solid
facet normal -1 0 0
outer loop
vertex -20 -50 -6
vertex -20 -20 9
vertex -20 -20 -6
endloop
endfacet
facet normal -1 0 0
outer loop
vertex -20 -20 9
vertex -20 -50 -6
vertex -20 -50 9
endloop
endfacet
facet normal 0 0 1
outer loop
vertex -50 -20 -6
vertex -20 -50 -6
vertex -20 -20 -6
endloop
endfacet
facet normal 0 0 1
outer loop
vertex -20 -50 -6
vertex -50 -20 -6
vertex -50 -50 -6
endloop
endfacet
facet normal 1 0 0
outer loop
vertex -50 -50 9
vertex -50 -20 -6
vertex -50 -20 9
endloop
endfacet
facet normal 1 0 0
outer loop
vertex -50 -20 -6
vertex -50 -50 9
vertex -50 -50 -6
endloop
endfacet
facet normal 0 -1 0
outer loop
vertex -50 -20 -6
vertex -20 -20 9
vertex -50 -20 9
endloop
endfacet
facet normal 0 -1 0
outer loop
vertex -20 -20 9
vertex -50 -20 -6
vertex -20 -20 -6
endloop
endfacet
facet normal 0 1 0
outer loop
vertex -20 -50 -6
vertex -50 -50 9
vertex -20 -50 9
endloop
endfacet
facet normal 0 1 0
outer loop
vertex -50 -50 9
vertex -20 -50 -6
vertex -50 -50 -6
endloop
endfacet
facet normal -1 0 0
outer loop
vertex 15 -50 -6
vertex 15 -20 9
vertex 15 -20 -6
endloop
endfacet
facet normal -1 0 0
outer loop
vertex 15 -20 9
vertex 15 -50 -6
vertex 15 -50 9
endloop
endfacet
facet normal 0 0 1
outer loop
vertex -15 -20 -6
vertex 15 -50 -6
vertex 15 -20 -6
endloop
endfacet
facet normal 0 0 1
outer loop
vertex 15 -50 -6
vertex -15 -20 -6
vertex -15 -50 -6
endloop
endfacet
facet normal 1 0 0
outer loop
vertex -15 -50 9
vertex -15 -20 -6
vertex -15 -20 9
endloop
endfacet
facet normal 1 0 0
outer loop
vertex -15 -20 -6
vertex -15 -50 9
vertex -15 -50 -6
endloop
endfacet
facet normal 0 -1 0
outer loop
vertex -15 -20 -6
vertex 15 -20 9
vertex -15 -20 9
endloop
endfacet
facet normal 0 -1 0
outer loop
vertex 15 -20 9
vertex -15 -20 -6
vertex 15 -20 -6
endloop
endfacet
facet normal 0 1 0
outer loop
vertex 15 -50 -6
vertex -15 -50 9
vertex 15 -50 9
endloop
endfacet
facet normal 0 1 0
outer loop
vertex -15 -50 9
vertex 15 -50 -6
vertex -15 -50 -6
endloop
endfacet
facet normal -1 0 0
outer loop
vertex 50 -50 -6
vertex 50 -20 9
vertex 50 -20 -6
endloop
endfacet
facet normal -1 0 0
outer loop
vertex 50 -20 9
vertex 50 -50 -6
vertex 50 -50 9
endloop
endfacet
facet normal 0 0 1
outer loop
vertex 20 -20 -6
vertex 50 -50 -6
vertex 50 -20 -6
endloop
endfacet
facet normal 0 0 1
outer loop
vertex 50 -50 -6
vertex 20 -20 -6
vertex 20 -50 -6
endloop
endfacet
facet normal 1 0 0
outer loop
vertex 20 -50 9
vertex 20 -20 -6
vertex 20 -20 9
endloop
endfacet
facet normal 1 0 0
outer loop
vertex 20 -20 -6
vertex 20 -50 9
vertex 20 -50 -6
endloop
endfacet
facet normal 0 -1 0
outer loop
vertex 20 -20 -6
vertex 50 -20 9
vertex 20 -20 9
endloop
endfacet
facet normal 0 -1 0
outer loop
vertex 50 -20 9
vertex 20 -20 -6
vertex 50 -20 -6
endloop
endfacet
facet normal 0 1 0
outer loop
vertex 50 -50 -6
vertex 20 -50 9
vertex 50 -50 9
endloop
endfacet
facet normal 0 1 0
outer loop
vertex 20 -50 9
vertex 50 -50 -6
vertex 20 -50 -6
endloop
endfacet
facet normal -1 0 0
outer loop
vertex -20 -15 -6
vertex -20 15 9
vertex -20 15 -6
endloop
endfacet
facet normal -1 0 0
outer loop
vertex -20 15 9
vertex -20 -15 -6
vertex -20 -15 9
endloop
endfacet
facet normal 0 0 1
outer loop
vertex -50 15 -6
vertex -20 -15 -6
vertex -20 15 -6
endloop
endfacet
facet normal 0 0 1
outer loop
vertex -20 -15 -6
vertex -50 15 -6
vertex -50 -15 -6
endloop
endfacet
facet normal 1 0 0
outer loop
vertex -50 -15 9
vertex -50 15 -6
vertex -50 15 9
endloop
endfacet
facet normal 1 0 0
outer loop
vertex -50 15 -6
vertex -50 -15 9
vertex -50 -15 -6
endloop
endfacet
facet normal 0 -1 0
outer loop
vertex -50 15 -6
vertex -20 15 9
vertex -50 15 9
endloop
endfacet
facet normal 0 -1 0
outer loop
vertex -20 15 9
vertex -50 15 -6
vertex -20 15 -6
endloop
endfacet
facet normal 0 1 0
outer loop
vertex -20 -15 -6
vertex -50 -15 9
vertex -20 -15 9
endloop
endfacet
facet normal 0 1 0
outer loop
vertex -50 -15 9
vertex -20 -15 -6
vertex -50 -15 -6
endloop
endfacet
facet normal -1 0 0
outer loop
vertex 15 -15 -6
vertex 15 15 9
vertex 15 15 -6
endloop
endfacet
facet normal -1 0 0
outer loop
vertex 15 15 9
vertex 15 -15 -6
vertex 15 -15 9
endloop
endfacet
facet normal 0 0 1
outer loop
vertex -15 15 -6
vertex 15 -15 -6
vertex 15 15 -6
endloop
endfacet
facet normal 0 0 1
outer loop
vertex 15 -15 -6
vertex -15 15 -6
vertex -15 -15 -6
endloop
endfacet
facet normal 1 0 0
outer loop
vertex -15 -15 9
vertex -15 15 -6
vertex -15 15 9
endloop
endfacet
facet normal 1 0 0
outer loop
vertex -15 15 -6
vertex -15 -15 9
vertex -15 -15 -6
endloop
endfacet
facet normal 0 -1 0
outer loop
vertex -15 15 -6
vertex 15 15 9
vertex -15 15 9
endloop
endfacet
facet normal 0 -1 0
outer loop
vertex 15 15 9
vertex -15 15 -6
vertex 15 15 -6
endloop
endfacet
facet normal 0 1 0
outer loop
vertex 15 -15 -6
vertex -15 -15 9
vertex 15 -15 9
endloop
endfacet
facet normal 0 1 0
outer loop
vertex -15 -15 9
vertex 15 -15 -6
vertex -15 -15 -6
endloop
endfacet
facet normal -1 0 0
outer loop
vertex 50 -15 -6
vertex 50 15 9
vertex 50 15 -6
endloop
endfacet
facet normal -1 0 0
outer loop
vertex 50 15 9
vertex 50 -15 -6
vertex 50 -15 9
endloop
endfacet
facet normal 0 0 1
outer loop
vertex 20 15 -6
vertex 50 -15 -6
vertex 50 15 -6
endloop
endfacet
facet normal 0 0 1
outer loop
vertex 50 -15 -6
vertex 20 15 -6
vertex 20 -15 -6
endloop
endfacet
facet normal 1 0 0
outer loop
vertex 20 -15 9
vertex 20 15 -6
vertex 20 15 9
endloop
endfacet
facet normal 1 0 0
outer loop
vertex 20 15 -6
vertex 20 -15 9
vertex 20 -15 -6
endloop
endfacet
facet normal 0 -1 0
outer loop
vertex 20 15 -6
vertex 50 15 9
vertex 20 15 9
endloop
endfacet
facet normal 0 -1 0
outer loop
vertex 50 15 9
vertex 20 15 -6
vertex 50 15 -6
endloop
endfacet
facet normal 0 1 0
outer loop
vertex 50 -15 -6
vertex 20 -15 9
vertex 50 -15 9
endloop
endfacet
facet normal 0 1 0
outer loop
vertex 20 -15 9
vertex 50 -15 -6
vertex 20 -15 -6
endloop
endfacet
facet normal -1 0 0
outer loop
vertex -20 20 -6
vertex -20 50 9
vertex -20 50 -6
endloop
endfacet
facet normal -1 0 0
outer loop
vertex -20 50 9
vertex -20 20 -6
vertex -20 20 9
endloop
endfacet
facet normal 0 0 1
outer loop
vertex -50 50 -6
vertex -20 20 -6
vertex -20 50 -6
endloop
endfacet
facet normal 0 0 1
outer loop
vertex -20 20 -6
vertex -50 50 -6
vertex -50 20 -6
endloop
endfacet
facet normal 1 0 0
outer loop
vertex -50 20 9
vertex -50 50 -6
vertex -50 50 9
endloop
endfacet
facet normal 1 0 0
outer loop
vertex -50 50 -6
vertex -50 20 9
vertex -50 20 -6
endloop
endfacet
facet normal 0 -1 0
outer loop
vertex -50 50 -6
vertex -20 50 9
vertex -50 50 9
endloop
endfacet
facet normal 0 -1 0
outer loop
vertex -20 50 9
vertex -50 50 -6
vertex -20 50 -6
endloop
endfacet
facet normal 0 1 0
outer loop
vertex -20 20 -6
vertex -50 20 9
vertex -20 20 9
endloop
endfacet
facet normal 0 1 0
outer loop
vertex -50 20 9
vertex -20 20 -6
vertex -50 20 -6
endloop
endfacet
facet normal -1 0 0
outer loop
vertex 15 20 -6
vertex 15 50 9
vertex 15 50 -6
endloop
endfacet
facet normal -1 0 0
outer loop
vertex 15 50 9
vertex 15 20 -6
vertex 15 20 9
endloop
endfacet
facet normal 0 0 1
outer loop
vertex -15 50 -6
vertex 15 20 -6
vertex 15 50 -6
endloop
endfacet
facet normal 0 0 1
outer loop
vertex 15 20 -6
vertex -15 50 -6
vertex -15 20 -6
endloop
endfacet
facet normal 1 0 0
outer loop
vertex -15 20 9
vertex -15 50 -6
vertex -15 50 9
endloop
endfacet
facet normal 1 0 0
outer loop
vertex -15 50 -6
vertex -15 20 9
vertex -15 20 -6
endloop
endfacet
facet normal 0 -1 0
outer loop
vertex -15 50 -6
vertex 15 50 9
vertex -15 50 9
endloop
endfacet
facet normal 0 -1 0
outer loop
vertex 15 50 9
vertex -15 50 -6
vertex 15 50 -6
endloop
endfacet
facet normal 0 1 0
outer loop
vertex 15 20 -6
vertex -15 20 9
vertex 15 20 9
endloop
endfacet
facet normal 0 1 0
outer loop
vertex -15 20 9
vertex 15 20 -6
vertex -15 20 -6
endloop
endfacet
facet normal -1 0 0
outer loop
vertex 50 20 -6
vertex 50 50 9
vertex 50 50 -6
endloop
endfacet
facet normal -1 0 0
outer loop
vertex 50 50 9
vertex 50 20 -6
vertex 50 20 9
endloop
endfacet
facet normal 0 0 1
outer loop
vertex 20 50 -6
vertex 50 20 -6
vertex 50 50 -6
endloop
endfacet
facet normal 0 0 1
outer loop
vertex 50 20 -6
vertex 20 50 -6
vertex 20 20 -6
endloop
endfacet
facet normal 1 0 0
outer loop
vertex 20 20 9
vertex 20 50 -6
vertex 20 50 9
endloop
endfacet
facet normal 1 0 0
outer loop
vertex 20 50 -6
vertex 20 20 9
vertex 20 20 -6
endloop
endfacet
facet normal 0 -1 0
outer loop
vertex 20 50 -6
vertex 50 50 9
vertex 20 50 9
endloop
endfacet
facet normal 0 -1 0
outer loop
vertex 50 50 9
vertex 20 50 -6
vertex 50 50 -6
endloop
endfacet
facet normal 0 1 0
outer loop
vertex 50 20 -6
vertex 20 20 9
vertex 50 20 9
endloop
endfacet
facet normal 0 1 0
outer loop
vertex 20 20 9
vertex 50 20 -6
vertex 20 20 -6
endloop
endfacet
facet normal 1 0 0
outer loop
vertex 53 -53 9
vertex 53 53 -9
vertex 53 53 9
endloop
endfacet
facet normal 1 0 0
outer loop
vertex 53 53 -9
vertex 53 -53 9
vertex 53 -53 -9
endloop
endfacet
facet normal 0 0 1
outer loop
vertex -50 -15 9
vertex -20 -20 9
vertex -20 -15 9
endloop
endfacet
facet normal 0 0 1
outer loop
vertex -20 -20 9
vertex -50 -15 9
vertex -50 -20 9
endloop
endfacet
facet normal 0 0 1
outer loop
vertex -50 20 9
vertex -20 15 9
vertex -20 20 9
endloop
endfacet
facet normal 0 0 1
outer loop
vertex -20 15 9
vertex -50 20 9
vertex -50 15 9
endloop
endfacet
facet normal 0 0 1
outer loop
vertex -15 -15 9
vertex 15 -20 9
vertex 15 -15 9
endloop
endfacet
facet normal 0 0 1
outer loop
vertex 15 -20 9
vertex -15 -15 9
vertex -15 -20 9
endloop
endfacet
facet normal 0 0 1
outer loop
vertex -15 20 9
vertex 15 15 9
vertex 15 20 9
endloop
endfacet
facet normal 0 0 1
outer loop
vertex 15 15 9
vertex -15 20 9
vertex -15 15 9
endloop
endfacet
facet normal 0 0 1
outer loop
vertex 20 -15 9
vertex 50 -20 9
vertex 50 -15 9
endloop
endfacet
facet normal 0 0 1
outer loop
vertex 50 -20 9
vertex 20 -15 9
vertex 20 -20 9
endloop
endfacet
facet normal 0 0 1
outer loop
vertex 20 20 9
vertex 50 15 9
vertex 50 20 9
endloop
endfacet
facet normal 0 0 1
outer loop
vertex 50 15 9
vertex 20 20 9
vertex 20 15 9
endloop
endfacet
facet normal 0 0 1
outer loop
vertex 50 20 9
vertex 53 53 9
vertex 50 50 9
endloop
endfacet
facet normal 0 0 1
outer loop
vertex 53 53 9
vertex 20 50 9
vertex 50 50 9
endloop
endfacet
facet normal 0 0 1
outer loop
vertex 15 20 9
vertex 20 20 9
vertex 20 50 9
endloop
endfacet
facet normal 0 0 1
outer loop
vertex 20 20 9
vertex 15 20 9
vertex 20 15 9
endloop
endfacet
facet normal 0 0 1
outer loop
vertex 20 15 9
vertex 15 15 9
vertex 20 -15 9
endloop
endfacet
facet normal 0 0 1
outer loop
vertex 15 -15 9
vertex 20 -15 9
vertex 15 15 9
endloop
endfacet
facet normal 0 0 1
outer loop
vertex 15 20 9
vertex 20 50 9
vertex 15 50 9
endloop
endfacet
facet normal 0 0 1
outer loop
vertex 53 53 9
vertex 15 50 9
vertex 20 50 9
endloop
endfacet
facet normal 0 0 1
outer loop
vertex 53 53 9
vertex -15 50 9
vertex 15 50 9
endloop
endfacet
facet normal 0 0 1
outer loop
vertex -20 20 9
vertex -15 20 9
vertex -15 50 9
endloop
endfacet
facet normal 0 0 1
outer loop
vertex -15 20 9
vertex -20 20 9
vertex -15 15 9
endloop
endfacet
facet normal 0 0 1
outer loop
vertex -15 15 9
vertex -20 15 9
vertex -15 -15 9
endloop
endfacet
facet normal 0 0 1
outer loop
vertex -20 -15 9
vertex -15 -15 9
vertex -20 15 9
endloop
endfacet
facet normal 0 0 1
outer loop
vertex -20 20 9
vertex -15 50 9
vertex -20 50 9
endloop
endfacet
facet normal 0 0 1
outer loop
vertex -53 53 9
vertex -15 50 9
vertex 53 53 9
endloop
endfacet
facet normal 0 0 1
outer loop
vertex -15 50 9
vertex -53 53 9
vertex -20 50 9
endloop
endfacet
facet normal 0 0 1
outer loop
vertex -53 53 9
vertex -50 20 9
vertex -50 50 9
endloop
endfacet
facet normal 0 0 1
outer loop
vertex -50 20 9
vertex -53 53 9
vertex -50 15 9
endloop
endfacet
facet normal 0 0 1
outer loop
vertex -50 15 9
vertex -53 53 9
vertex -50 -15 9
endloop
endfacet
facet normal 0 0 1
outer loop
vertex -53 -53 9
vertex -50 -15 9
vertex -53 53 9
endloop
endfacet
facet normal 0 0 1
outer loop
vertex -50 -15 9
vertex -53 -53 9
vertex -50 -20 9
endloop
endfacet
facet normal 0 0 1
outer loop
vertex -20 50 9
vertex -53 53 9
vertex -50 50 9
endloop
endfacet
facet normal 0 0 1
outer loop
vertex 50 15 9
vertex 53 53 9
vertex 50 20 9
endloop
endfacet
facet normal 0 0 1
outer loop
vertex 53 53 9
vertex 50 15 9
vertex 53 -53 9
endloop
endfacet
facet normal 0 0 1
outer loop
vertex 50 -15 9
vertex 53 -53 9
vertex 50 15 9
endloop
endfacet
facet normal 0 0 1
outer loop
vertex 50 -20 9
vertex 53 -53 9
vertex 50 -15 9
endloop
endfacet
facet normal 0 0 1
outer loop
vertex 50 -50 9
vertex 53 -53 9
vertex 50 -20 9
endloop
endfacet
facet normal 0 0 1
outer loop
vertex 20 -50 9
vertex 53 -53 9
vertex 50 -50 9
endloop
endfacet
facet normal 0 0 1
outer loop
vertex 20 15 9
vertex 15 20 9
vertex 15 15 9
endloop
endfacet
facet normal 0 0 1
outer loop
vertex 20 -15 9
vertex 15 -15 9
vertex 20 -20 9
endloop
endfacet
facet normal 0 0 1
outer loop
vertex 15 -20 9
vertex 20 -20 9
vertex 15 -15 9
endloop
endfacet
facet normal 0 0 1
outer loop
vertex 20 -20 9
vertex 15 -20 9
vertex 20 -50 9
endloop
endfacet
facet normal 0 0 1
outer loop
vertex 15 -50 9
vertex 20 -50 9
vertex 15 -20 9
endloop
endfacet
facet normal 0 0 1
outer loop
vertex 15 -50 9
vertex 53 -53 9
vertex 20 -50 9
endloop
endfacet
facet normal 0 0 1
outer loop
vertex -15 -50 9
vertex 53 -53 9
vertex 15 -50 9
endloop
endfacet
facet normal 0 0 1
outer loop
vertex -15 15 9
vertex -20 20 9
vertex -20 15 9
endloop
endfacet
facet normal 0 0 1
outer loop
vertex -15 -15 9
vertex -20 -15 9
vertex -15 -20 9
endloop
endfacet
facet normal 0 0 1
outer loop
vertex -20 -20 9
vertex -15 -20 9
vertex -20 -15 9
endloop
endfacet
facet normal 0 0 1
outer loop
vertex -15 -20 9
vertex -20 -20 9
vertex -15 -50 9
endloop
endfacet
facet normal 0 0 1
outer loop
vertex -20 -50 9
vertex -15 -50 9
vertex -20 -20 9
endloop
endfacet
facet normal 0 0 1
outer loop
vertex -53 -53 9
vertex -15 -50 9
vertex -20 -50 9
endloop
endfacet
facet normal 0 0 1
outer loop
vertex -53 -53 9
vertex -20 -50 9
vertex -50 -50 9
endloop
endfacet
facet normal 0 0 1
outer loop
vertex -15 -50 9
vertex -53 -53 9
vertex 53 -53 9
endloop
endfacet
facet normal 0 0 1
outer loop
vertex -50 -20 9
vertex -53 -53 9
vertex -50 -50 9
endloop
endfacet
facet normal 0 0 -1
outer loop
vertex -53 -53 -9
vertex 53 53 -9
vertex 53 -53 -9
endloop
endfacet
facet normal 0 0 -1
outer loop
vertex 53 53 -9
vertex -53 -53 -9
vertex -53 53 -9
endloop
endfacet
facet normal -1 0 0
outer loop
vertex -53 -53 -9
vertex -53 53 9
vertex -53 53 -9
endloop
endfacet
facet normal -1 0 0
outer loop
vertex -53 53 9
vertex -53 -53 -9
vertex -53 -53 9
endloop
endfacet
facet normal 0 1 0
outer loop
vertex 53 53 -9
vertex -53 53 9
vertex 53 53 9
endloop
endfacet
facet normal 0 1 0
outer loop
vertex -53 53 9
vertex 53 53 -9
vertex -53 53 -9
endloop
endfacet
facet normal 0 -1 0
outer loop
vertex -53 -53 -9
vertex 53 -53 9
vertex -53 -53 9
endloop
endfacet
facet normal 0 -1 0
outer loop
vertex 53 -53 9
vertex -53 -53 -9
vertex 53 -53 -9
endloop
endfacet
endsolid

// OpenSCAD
$fn = 32;

// ----------------------------------------------------------------------
// Pocket plate 106 x 106 x 18
// 3 x 3 pockets 30 mm square, 15 mm deep
// ----------------------------------------------------------------------

// --- parameters (mm) ---
thickness = 18;  // plate thickness
floor_t = 3;     // material left under each pocket
pocket = 30;     // pocket side length
pitch_x = 35;    // pocket pitch along X
pitch_y = 35;    // pocket pitch along Y
cols = 3;        // pockets per row
rows = 3;        // rows of pockets

// --- derived feature positions (mm) ---
depth = thickness - floor_t;        // = 15   pocket depth, down to the floor
span_x = (cols - 1) * pitch_x;      // = 70   distance between outer pockets
span_y = (rows - 1) * pitch_y;      // = 70   distance between outer pocket rows
origin_x = -span_x / 2;             // = -35   X of the first pocket
origin_y = -span_y / 2;             // = -35   Y of the first pocket
plate = [span_x + pocket + 6, span_y + pocket + 6, thickness];  // = [106, 106, 18]   overall size: pockets plus 3 mm of wall on each side
feature_centers = [
  [origin_x + 0 * pitch_x, origin_y + 0 * pitch_y],
  [origin_x + 1 * pitch_x, origin_y + 0 * pitch_y],
  [origin_x + 2 * pitch_x, origin_y + 0 * pitch_y],
  [origin_x + 0 * pitch_x, origin_y + 1 * pitch_y],
  [origin_x + 1 * pitch_x, origin_y + 1 * pitch_y],
  [origin_x + 2 * pitch_x, origin_y + 1 * pitch_y],
  [origin_x + 0 * pitch_x, origin_y + 2 * pitch_y],
  [origin_x + 1 * pitch_x, origin_y + 2 * pitch_y],
  [origin_x + 2 * pitch_x, origin_y + 2 * pitch_y]
];   // pocket centres, used verbatim by the cutter loop

// plate outline, then one pocket per centre in feature_centers
difference() {
  cube(plate, center = true);
  for (centre = feature_centers)
    translate([centre[0] - pocket / 2, centre[1] - pocket / 2, plate[2] / 2 - depth])
      cube([pocket, pocket, depth + 1]);  // centred on the declared pocket centre
}
